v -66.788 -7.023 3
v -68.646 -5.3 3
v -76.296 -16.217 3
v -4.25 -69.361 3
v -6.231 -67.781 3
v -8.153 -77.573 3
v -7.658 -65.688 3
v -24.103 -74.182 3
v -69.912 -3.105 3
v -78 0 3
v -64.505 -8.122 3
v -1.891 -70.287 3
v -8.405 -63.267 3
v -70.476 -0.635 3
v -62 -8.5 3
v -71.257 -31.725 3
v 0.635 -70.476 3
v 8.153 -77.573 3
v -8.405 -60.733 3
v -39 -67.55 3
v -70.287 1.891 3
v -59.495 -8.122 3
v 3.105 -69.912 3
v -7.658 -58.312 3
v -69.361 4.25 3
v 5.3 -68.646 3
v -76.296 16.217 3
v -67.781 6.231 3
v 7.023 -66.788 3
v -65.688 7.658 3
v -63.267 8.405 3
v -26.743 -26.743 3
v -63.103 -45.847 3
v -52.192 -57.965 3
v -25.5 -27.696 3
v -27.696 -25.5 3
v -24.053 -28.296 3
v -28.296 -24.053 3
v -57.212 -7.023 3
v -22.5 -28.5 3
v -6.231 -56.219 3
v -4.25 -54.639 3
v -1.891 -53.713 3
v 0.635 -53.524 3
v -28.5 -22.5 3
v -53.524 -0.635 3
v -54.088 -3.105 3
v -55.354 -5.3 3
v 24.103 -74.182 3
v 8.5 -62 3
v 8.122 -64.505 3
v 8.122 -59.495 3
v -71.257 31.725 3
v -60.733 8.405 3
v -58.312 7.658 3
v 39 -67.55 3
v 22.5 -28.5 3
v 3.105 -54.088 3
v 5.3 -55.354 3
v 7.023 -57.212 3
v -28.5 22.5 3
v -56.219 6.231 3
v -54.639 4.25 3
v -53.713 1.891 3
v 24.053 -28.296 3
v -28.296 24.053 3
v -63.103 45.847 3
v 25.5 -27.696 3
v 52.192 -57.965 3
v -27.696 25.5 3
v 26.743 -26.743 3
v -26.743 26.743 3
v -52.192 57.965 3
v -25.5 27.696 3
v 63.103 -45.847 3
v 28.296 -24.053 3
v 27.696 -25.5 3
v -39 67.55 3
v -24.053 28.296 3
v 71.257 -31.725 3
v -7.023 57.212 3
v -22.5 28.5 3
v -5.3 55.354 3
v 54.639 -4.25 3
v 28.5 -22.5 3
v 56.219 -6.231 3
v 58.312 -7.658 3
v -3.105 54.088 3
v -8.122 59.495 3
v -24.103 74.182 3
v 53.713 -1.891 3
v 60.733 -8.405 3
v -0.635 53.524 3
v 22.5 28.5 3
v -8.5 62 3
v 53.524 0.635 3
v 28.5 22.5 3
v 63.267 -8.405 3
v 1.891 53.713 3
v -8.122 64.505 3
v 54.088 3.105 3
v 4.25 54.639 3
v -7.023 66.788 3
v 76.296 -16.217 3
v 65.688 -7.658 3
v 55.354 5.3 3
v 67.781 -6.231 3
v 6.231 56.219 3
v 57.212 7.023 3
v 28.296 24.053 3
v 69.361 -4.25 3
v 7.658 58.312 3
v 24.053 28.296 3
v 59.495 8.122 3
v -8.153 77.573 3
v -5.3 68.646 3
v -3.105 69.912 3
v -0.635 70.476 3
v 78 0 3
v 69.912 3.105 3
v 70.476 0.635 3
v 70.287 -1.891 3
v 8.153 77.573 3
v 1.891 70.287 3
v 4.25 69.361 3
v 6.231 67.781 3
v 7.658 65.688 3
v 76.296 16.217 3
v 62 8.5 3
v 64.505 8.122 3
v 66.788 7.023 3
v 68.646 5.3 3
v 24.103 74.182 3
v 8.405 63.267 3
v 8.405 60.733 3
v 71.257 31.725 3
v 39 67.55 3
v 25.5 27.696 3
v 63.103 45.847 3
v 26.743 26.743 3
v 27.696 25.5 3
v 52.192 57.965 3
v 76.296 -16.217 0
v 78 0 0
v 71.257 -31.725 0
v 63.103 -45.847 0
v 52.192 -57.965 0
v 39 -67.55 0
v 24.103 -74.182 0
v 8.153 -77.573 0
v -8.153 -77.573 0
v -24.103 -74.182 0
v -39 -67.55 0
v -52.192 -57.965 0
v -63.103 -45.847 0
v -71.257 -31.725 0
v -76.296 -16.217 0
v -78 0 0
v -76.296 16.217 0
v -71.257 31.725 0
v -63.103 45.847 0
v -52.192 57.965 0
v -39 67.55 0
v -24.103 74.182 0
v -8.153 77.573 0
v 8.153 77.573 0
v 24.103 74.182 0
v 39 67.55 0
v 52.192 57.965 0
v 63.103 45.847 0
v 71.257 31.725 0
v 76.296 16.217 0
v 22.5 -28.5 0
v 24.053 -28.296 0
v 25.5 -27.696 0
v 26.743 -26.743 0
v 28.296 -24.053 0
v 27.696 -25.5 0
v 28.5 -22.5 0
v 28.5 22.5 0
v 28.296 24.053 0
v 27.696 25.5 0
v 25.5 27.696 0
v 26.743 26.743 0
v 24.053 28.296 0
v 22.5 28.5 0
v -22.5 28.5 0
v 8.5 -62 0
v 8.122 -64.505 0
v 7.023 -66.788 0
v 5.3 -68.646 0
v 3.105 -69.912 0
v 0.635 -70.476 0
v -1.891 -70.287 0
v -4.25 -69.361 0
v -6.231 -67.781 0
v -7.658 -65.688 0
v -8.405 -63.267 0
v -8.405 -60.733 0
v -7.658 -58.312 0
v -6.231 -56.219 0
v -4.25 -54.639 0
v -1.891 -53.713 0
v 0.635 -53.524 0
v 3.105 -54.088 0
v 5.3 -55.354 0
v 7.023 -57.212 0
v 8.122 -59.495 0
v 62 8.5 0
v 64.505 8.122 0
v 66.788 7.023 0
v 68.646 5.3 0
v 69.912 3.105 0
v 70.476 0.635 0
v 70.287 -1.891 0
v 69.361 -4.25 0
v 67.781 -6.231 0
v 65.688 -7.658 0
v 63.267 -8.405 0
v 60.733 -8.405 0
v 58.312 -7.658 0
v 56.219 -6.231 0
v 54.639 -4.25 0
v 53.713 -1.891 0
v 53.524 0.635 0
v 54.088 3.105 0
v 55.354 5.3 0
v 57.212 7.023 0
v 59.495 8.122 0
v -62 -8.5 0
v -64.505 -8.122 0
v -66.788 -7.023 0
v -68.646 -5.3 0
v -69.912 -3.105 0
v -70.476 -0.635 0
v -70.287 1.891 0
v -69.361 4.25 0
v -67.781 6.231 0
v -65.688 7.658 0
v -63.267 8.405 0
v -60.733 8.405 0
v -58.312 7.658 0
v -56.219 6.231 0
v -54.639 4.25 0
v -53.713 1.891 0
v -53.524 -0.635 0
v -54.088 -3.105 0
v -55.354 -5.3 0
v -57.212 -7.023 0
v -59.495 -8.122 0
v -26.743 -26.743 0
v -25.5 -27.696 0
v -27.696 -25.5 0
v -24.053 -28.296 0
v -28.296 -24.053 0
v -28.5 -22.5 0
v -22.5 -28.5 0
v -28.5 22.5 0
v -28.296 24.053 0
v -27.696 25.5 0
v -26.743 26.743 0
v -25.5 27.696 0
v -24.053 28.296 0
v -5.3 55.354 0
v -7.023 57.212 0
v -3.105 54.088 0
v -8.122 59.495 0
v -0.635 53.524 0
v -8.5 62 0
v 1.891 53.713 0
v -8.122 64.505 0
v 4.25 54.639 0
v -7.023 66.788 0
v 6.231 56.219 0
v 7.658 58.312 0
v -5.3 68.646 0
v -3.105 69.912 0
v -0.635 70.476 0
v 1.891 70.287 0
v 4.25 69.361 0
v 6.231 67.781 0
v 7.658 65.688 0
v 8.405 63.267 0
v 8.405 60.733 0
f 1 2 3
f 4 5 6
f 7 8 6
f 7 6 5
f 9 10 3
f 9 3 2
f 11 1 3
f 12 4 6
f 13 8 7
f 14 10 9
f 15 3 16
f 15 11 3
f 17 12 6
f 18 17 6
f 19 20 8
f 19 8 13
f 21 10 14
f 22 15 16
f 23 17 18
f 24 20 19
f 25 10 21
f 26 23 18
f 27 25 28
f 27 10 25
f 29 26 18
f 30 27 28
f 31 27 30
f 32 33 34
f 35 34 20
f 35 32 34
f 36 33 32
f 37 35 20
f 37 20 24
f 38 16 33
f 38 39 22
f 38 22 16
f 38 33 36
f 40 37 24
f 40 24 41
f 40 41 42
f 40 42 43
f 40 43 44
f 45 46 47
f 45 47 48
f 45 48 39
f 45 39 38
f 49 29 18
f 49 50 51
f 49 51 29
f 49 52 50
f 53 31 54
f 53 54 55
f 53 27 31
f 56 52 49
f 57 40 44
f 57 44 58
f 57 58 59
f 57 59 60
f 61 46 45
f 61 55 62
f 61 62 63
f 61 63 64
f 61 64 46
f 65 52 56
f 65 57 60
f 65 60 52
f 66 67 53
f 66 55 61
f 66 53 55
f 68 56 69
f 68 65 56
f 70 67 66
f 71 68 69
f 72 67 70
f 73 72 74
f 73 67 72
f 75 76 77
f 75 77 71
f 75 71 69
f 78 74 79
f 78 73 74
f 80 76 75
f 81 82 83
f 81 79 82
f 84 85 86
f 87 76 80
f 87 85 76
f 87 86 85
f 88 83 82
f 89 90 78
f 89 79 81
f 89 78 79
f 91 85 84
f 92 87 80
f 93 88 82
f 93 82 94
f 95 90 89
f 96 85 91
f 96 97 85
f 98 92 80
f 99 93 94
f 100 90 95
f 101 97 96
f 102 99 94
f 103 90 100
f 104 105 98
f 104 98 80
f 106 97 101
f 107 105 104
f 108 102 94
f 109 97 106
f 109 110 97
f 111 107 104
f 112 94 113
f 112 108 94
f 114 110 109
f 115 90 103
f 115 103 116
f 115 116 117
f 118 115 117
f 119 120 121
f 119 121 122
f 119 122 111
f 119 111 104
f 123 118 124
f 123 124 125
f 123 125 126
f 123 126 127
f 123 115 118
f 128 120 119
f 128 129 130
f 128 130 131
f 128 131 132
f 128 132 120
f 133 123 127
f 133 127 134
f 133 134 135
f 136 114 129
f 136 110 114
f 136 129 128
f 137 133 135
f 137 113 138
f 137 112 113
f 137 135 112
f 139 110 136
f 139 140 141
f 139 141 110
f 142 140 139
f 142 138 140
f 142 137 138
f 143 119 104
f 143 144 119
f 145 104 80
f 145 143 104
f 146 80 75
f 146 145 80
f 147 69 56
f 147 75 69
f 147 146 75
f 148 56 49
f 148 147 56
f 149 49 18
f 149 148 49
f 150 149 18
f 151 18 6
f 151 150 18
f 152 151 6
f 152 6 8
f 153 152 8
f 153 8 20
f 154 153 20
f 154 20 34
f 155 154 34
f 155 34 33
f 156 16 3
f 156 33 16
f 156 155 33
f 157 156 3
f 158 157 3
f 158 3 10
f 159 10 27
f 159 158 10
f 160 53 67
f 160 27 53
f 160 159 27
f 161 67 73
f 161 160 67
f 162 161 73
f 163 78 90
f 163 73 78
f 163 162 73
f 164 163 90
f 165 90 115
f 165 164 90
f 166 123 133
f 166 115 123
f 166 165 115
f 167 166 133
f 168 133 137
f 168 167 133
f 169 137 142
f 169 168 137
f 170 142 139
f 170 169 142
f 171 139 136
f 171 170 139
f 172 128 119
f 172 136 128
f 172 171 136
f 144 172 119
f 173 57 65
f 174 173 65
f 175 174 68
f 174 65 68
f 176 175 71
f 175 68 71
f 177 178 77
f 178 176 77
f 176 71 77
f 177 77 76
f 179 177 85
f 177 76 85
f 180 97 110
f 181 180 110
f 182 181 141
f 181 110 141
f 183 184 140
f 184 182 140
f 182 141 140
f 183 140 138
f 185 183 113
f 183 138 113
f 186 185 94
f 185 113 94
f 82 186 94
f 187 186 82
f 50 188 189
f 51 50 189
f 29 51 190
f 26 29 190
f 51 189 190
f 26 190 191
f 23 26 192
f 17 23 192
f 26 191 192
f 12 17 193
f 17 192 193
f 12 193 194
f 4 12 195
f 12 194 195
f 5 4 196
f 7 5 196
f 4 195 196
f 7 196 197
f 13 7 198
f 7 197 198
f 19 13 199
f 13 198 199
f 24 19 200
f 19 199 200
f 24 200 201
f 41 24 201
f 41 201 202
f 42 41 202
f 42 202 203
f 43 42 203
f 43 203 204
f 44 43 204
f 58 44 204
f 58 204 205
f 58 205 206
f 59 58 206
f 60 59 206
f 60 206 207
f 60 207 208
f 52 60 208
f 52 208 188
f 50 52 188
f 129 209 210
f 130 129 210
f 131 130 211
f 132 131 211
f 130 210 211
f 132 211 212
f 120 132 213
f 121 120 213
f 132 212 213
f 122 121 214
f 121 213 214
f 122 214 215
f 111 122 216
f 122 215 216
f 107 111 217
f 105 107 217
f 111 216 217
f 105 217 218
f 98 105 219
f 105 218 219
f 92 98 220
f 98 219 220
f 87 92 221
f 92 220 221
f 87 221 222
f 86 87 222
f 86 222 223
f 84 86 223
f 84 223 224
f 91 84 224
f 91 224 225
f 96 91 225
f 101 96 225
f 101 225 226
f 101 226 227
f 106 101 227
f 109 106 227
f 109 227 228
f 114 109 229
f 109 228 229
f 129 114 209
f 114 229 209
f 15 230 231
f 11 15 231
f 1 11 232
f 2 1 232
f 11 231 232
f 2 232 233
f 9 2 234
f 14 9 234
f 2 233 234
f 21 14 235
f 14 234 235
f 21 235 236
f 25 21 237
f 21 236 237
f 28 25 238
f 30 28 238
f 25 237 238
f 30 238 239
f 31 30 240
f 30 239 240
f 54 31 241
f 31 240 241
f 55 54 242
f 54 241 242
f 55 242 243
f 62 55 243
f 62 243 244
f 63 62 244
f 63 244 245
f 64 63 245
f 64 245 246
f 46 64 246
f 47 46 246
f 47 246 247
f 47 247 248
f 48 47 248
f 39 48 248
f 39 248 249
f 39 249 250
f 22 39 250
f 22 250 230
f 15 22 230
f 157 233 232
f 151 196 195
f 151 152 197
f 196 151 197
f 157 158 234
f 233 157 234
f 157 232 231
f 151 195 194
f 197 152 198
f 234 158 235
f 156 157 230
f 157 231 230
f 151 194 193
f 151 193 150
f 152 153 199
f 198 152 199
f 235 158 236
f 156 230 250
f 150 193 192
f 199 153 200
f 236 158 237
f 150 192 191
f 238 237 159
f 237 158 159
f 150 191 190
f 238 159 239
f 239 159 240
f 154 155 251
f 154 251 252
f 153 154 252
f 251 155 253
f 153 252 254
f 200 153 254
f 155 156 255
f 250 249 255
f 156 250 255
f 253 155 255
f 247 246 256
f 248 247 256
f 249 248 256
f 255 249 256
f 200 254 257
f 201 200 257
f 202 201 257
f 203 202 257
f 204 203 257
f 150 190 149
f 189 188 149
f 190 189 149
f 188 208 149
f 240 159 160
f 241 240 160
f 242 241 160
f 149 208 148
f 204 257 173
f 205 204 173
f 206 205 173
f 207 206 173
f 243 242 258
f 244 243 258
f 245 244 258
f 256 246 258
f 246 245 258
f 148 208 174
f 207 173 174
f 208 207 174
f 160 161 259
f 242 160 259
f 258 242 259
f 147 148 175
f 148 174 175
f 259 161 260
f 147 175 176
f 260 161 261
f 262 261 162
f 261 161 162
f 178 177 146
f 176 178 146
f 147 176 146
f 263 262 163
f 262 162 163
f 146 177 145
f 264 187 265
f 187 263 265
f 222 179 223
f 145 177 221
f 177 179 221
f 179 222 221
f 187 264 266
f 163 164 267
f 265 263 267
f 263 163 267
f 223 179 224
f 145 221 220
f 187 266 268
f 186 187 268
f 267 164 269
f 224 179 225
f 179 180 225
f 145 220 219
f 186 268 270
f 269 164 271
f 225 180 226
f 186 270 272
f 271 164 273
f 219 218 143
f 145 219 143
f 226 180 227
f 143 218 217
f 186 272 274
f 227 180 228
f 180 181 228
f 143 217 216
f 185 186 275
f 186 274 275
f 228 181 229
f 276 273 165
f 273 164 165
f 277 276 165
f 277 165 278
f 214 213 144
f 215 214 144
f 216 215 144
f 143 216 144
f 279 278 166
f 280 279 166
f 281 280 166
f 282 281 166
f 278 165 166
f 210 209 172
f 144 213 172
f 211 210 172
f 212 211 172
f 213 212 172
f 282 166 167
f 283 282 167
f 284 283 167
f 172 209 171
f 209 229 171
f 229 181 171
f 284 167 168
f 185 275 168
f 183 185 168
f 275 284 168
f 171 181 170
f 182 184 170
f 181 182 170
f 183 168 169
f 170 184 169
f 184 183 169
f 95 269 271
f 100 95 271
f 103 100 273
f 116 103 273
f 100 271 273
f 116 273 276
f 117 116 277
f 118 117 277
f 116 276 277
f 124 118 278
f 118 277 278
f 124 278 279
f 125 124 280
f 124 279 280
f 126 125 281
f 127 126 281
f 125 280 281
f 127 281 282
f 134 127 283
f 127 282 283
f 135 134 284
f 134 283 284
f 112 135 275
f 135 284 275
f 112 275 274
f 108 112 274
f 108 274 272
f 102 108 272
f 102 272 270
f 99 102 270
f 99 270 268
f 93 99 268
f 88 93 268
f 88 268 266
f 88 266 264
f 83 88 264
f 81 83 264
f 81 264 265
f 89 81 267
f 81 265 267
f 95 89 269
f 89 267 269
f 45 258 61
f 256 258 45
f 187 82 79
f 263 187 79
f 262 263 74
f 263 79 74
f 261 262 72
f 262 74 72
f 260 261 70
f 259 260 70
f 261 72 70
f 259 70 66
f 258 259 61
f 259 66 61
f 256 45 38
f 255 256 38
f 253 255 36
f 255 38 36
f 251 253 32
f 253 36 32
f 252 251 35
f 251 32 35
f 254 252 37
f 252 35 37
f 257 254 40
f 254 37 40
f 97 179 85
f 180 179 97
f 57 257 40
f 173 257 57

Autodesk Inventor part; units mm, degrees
ref_plane "YZ Plane" through (0, 0, 0) normal (1, 0, 0) x (0, 1, 0)
ref_plane "XZ Plane" through (0, 0, 0) normal (0, 1, 0) x (-1, 0, 0)
ref_plane "XY Plane" through (0, 0, 0) normal (0, 0, 1) x (1, 0, 0)
sketch "Sketch1" plane through (0, 0, 0) normal (0, 0, 1) x (1, 0, 0)
  circle A0 centre (0, 0) radius 78
  line L0 (28.5, 28.5) -> (-28.5, 28.5)
  line L1 (-28.5, 28.5) -> (-28.5, -28.5)
  line L2 (-28.5, -28.5) -> (28.5, -28.5)
  line L3 (28.5, -28.5) -> (28.5, 28.5)
  line L4 (28.5, 28.5) -> (-28.5, -28.5) construction
  line L5 (-28.5, 28.5) -> (28.5, -28.5) construction
  dimension "d157" = 156
  dimension "d158" = 57
  dimension "d159" = 57
extrude "Plate5" add sketch "Sketch1" along normal blind 3
sketch "Sketch7" plane through (0, 0, 0) normal (0, 0, -1) x (-1, 0, 0)
  circle A0 centre (0, 62) radius 8.5
  point P0 (0, 0)
  dimension "d160" = 17
  dimension "d161" = 62
extrude "Cut1" cut sketch "Sketch7" against normal blind 3
pattern_circular "Circular Pattern1" count 4 over 360 about axis through (0, 0, -10) along (0, 0, 1) of "Cut1"
fillet "Corner Round1" radius 6 4 edges at (-28.5, -28.5, 1.5) (28.5, -28.5, 1.5) (28.5, 28.5, 1.5) (-28.5, 28.5, 1.5)
properties part number "TZS 1757 FDS 940x50 FLANGE" material "Stainless Steel"
